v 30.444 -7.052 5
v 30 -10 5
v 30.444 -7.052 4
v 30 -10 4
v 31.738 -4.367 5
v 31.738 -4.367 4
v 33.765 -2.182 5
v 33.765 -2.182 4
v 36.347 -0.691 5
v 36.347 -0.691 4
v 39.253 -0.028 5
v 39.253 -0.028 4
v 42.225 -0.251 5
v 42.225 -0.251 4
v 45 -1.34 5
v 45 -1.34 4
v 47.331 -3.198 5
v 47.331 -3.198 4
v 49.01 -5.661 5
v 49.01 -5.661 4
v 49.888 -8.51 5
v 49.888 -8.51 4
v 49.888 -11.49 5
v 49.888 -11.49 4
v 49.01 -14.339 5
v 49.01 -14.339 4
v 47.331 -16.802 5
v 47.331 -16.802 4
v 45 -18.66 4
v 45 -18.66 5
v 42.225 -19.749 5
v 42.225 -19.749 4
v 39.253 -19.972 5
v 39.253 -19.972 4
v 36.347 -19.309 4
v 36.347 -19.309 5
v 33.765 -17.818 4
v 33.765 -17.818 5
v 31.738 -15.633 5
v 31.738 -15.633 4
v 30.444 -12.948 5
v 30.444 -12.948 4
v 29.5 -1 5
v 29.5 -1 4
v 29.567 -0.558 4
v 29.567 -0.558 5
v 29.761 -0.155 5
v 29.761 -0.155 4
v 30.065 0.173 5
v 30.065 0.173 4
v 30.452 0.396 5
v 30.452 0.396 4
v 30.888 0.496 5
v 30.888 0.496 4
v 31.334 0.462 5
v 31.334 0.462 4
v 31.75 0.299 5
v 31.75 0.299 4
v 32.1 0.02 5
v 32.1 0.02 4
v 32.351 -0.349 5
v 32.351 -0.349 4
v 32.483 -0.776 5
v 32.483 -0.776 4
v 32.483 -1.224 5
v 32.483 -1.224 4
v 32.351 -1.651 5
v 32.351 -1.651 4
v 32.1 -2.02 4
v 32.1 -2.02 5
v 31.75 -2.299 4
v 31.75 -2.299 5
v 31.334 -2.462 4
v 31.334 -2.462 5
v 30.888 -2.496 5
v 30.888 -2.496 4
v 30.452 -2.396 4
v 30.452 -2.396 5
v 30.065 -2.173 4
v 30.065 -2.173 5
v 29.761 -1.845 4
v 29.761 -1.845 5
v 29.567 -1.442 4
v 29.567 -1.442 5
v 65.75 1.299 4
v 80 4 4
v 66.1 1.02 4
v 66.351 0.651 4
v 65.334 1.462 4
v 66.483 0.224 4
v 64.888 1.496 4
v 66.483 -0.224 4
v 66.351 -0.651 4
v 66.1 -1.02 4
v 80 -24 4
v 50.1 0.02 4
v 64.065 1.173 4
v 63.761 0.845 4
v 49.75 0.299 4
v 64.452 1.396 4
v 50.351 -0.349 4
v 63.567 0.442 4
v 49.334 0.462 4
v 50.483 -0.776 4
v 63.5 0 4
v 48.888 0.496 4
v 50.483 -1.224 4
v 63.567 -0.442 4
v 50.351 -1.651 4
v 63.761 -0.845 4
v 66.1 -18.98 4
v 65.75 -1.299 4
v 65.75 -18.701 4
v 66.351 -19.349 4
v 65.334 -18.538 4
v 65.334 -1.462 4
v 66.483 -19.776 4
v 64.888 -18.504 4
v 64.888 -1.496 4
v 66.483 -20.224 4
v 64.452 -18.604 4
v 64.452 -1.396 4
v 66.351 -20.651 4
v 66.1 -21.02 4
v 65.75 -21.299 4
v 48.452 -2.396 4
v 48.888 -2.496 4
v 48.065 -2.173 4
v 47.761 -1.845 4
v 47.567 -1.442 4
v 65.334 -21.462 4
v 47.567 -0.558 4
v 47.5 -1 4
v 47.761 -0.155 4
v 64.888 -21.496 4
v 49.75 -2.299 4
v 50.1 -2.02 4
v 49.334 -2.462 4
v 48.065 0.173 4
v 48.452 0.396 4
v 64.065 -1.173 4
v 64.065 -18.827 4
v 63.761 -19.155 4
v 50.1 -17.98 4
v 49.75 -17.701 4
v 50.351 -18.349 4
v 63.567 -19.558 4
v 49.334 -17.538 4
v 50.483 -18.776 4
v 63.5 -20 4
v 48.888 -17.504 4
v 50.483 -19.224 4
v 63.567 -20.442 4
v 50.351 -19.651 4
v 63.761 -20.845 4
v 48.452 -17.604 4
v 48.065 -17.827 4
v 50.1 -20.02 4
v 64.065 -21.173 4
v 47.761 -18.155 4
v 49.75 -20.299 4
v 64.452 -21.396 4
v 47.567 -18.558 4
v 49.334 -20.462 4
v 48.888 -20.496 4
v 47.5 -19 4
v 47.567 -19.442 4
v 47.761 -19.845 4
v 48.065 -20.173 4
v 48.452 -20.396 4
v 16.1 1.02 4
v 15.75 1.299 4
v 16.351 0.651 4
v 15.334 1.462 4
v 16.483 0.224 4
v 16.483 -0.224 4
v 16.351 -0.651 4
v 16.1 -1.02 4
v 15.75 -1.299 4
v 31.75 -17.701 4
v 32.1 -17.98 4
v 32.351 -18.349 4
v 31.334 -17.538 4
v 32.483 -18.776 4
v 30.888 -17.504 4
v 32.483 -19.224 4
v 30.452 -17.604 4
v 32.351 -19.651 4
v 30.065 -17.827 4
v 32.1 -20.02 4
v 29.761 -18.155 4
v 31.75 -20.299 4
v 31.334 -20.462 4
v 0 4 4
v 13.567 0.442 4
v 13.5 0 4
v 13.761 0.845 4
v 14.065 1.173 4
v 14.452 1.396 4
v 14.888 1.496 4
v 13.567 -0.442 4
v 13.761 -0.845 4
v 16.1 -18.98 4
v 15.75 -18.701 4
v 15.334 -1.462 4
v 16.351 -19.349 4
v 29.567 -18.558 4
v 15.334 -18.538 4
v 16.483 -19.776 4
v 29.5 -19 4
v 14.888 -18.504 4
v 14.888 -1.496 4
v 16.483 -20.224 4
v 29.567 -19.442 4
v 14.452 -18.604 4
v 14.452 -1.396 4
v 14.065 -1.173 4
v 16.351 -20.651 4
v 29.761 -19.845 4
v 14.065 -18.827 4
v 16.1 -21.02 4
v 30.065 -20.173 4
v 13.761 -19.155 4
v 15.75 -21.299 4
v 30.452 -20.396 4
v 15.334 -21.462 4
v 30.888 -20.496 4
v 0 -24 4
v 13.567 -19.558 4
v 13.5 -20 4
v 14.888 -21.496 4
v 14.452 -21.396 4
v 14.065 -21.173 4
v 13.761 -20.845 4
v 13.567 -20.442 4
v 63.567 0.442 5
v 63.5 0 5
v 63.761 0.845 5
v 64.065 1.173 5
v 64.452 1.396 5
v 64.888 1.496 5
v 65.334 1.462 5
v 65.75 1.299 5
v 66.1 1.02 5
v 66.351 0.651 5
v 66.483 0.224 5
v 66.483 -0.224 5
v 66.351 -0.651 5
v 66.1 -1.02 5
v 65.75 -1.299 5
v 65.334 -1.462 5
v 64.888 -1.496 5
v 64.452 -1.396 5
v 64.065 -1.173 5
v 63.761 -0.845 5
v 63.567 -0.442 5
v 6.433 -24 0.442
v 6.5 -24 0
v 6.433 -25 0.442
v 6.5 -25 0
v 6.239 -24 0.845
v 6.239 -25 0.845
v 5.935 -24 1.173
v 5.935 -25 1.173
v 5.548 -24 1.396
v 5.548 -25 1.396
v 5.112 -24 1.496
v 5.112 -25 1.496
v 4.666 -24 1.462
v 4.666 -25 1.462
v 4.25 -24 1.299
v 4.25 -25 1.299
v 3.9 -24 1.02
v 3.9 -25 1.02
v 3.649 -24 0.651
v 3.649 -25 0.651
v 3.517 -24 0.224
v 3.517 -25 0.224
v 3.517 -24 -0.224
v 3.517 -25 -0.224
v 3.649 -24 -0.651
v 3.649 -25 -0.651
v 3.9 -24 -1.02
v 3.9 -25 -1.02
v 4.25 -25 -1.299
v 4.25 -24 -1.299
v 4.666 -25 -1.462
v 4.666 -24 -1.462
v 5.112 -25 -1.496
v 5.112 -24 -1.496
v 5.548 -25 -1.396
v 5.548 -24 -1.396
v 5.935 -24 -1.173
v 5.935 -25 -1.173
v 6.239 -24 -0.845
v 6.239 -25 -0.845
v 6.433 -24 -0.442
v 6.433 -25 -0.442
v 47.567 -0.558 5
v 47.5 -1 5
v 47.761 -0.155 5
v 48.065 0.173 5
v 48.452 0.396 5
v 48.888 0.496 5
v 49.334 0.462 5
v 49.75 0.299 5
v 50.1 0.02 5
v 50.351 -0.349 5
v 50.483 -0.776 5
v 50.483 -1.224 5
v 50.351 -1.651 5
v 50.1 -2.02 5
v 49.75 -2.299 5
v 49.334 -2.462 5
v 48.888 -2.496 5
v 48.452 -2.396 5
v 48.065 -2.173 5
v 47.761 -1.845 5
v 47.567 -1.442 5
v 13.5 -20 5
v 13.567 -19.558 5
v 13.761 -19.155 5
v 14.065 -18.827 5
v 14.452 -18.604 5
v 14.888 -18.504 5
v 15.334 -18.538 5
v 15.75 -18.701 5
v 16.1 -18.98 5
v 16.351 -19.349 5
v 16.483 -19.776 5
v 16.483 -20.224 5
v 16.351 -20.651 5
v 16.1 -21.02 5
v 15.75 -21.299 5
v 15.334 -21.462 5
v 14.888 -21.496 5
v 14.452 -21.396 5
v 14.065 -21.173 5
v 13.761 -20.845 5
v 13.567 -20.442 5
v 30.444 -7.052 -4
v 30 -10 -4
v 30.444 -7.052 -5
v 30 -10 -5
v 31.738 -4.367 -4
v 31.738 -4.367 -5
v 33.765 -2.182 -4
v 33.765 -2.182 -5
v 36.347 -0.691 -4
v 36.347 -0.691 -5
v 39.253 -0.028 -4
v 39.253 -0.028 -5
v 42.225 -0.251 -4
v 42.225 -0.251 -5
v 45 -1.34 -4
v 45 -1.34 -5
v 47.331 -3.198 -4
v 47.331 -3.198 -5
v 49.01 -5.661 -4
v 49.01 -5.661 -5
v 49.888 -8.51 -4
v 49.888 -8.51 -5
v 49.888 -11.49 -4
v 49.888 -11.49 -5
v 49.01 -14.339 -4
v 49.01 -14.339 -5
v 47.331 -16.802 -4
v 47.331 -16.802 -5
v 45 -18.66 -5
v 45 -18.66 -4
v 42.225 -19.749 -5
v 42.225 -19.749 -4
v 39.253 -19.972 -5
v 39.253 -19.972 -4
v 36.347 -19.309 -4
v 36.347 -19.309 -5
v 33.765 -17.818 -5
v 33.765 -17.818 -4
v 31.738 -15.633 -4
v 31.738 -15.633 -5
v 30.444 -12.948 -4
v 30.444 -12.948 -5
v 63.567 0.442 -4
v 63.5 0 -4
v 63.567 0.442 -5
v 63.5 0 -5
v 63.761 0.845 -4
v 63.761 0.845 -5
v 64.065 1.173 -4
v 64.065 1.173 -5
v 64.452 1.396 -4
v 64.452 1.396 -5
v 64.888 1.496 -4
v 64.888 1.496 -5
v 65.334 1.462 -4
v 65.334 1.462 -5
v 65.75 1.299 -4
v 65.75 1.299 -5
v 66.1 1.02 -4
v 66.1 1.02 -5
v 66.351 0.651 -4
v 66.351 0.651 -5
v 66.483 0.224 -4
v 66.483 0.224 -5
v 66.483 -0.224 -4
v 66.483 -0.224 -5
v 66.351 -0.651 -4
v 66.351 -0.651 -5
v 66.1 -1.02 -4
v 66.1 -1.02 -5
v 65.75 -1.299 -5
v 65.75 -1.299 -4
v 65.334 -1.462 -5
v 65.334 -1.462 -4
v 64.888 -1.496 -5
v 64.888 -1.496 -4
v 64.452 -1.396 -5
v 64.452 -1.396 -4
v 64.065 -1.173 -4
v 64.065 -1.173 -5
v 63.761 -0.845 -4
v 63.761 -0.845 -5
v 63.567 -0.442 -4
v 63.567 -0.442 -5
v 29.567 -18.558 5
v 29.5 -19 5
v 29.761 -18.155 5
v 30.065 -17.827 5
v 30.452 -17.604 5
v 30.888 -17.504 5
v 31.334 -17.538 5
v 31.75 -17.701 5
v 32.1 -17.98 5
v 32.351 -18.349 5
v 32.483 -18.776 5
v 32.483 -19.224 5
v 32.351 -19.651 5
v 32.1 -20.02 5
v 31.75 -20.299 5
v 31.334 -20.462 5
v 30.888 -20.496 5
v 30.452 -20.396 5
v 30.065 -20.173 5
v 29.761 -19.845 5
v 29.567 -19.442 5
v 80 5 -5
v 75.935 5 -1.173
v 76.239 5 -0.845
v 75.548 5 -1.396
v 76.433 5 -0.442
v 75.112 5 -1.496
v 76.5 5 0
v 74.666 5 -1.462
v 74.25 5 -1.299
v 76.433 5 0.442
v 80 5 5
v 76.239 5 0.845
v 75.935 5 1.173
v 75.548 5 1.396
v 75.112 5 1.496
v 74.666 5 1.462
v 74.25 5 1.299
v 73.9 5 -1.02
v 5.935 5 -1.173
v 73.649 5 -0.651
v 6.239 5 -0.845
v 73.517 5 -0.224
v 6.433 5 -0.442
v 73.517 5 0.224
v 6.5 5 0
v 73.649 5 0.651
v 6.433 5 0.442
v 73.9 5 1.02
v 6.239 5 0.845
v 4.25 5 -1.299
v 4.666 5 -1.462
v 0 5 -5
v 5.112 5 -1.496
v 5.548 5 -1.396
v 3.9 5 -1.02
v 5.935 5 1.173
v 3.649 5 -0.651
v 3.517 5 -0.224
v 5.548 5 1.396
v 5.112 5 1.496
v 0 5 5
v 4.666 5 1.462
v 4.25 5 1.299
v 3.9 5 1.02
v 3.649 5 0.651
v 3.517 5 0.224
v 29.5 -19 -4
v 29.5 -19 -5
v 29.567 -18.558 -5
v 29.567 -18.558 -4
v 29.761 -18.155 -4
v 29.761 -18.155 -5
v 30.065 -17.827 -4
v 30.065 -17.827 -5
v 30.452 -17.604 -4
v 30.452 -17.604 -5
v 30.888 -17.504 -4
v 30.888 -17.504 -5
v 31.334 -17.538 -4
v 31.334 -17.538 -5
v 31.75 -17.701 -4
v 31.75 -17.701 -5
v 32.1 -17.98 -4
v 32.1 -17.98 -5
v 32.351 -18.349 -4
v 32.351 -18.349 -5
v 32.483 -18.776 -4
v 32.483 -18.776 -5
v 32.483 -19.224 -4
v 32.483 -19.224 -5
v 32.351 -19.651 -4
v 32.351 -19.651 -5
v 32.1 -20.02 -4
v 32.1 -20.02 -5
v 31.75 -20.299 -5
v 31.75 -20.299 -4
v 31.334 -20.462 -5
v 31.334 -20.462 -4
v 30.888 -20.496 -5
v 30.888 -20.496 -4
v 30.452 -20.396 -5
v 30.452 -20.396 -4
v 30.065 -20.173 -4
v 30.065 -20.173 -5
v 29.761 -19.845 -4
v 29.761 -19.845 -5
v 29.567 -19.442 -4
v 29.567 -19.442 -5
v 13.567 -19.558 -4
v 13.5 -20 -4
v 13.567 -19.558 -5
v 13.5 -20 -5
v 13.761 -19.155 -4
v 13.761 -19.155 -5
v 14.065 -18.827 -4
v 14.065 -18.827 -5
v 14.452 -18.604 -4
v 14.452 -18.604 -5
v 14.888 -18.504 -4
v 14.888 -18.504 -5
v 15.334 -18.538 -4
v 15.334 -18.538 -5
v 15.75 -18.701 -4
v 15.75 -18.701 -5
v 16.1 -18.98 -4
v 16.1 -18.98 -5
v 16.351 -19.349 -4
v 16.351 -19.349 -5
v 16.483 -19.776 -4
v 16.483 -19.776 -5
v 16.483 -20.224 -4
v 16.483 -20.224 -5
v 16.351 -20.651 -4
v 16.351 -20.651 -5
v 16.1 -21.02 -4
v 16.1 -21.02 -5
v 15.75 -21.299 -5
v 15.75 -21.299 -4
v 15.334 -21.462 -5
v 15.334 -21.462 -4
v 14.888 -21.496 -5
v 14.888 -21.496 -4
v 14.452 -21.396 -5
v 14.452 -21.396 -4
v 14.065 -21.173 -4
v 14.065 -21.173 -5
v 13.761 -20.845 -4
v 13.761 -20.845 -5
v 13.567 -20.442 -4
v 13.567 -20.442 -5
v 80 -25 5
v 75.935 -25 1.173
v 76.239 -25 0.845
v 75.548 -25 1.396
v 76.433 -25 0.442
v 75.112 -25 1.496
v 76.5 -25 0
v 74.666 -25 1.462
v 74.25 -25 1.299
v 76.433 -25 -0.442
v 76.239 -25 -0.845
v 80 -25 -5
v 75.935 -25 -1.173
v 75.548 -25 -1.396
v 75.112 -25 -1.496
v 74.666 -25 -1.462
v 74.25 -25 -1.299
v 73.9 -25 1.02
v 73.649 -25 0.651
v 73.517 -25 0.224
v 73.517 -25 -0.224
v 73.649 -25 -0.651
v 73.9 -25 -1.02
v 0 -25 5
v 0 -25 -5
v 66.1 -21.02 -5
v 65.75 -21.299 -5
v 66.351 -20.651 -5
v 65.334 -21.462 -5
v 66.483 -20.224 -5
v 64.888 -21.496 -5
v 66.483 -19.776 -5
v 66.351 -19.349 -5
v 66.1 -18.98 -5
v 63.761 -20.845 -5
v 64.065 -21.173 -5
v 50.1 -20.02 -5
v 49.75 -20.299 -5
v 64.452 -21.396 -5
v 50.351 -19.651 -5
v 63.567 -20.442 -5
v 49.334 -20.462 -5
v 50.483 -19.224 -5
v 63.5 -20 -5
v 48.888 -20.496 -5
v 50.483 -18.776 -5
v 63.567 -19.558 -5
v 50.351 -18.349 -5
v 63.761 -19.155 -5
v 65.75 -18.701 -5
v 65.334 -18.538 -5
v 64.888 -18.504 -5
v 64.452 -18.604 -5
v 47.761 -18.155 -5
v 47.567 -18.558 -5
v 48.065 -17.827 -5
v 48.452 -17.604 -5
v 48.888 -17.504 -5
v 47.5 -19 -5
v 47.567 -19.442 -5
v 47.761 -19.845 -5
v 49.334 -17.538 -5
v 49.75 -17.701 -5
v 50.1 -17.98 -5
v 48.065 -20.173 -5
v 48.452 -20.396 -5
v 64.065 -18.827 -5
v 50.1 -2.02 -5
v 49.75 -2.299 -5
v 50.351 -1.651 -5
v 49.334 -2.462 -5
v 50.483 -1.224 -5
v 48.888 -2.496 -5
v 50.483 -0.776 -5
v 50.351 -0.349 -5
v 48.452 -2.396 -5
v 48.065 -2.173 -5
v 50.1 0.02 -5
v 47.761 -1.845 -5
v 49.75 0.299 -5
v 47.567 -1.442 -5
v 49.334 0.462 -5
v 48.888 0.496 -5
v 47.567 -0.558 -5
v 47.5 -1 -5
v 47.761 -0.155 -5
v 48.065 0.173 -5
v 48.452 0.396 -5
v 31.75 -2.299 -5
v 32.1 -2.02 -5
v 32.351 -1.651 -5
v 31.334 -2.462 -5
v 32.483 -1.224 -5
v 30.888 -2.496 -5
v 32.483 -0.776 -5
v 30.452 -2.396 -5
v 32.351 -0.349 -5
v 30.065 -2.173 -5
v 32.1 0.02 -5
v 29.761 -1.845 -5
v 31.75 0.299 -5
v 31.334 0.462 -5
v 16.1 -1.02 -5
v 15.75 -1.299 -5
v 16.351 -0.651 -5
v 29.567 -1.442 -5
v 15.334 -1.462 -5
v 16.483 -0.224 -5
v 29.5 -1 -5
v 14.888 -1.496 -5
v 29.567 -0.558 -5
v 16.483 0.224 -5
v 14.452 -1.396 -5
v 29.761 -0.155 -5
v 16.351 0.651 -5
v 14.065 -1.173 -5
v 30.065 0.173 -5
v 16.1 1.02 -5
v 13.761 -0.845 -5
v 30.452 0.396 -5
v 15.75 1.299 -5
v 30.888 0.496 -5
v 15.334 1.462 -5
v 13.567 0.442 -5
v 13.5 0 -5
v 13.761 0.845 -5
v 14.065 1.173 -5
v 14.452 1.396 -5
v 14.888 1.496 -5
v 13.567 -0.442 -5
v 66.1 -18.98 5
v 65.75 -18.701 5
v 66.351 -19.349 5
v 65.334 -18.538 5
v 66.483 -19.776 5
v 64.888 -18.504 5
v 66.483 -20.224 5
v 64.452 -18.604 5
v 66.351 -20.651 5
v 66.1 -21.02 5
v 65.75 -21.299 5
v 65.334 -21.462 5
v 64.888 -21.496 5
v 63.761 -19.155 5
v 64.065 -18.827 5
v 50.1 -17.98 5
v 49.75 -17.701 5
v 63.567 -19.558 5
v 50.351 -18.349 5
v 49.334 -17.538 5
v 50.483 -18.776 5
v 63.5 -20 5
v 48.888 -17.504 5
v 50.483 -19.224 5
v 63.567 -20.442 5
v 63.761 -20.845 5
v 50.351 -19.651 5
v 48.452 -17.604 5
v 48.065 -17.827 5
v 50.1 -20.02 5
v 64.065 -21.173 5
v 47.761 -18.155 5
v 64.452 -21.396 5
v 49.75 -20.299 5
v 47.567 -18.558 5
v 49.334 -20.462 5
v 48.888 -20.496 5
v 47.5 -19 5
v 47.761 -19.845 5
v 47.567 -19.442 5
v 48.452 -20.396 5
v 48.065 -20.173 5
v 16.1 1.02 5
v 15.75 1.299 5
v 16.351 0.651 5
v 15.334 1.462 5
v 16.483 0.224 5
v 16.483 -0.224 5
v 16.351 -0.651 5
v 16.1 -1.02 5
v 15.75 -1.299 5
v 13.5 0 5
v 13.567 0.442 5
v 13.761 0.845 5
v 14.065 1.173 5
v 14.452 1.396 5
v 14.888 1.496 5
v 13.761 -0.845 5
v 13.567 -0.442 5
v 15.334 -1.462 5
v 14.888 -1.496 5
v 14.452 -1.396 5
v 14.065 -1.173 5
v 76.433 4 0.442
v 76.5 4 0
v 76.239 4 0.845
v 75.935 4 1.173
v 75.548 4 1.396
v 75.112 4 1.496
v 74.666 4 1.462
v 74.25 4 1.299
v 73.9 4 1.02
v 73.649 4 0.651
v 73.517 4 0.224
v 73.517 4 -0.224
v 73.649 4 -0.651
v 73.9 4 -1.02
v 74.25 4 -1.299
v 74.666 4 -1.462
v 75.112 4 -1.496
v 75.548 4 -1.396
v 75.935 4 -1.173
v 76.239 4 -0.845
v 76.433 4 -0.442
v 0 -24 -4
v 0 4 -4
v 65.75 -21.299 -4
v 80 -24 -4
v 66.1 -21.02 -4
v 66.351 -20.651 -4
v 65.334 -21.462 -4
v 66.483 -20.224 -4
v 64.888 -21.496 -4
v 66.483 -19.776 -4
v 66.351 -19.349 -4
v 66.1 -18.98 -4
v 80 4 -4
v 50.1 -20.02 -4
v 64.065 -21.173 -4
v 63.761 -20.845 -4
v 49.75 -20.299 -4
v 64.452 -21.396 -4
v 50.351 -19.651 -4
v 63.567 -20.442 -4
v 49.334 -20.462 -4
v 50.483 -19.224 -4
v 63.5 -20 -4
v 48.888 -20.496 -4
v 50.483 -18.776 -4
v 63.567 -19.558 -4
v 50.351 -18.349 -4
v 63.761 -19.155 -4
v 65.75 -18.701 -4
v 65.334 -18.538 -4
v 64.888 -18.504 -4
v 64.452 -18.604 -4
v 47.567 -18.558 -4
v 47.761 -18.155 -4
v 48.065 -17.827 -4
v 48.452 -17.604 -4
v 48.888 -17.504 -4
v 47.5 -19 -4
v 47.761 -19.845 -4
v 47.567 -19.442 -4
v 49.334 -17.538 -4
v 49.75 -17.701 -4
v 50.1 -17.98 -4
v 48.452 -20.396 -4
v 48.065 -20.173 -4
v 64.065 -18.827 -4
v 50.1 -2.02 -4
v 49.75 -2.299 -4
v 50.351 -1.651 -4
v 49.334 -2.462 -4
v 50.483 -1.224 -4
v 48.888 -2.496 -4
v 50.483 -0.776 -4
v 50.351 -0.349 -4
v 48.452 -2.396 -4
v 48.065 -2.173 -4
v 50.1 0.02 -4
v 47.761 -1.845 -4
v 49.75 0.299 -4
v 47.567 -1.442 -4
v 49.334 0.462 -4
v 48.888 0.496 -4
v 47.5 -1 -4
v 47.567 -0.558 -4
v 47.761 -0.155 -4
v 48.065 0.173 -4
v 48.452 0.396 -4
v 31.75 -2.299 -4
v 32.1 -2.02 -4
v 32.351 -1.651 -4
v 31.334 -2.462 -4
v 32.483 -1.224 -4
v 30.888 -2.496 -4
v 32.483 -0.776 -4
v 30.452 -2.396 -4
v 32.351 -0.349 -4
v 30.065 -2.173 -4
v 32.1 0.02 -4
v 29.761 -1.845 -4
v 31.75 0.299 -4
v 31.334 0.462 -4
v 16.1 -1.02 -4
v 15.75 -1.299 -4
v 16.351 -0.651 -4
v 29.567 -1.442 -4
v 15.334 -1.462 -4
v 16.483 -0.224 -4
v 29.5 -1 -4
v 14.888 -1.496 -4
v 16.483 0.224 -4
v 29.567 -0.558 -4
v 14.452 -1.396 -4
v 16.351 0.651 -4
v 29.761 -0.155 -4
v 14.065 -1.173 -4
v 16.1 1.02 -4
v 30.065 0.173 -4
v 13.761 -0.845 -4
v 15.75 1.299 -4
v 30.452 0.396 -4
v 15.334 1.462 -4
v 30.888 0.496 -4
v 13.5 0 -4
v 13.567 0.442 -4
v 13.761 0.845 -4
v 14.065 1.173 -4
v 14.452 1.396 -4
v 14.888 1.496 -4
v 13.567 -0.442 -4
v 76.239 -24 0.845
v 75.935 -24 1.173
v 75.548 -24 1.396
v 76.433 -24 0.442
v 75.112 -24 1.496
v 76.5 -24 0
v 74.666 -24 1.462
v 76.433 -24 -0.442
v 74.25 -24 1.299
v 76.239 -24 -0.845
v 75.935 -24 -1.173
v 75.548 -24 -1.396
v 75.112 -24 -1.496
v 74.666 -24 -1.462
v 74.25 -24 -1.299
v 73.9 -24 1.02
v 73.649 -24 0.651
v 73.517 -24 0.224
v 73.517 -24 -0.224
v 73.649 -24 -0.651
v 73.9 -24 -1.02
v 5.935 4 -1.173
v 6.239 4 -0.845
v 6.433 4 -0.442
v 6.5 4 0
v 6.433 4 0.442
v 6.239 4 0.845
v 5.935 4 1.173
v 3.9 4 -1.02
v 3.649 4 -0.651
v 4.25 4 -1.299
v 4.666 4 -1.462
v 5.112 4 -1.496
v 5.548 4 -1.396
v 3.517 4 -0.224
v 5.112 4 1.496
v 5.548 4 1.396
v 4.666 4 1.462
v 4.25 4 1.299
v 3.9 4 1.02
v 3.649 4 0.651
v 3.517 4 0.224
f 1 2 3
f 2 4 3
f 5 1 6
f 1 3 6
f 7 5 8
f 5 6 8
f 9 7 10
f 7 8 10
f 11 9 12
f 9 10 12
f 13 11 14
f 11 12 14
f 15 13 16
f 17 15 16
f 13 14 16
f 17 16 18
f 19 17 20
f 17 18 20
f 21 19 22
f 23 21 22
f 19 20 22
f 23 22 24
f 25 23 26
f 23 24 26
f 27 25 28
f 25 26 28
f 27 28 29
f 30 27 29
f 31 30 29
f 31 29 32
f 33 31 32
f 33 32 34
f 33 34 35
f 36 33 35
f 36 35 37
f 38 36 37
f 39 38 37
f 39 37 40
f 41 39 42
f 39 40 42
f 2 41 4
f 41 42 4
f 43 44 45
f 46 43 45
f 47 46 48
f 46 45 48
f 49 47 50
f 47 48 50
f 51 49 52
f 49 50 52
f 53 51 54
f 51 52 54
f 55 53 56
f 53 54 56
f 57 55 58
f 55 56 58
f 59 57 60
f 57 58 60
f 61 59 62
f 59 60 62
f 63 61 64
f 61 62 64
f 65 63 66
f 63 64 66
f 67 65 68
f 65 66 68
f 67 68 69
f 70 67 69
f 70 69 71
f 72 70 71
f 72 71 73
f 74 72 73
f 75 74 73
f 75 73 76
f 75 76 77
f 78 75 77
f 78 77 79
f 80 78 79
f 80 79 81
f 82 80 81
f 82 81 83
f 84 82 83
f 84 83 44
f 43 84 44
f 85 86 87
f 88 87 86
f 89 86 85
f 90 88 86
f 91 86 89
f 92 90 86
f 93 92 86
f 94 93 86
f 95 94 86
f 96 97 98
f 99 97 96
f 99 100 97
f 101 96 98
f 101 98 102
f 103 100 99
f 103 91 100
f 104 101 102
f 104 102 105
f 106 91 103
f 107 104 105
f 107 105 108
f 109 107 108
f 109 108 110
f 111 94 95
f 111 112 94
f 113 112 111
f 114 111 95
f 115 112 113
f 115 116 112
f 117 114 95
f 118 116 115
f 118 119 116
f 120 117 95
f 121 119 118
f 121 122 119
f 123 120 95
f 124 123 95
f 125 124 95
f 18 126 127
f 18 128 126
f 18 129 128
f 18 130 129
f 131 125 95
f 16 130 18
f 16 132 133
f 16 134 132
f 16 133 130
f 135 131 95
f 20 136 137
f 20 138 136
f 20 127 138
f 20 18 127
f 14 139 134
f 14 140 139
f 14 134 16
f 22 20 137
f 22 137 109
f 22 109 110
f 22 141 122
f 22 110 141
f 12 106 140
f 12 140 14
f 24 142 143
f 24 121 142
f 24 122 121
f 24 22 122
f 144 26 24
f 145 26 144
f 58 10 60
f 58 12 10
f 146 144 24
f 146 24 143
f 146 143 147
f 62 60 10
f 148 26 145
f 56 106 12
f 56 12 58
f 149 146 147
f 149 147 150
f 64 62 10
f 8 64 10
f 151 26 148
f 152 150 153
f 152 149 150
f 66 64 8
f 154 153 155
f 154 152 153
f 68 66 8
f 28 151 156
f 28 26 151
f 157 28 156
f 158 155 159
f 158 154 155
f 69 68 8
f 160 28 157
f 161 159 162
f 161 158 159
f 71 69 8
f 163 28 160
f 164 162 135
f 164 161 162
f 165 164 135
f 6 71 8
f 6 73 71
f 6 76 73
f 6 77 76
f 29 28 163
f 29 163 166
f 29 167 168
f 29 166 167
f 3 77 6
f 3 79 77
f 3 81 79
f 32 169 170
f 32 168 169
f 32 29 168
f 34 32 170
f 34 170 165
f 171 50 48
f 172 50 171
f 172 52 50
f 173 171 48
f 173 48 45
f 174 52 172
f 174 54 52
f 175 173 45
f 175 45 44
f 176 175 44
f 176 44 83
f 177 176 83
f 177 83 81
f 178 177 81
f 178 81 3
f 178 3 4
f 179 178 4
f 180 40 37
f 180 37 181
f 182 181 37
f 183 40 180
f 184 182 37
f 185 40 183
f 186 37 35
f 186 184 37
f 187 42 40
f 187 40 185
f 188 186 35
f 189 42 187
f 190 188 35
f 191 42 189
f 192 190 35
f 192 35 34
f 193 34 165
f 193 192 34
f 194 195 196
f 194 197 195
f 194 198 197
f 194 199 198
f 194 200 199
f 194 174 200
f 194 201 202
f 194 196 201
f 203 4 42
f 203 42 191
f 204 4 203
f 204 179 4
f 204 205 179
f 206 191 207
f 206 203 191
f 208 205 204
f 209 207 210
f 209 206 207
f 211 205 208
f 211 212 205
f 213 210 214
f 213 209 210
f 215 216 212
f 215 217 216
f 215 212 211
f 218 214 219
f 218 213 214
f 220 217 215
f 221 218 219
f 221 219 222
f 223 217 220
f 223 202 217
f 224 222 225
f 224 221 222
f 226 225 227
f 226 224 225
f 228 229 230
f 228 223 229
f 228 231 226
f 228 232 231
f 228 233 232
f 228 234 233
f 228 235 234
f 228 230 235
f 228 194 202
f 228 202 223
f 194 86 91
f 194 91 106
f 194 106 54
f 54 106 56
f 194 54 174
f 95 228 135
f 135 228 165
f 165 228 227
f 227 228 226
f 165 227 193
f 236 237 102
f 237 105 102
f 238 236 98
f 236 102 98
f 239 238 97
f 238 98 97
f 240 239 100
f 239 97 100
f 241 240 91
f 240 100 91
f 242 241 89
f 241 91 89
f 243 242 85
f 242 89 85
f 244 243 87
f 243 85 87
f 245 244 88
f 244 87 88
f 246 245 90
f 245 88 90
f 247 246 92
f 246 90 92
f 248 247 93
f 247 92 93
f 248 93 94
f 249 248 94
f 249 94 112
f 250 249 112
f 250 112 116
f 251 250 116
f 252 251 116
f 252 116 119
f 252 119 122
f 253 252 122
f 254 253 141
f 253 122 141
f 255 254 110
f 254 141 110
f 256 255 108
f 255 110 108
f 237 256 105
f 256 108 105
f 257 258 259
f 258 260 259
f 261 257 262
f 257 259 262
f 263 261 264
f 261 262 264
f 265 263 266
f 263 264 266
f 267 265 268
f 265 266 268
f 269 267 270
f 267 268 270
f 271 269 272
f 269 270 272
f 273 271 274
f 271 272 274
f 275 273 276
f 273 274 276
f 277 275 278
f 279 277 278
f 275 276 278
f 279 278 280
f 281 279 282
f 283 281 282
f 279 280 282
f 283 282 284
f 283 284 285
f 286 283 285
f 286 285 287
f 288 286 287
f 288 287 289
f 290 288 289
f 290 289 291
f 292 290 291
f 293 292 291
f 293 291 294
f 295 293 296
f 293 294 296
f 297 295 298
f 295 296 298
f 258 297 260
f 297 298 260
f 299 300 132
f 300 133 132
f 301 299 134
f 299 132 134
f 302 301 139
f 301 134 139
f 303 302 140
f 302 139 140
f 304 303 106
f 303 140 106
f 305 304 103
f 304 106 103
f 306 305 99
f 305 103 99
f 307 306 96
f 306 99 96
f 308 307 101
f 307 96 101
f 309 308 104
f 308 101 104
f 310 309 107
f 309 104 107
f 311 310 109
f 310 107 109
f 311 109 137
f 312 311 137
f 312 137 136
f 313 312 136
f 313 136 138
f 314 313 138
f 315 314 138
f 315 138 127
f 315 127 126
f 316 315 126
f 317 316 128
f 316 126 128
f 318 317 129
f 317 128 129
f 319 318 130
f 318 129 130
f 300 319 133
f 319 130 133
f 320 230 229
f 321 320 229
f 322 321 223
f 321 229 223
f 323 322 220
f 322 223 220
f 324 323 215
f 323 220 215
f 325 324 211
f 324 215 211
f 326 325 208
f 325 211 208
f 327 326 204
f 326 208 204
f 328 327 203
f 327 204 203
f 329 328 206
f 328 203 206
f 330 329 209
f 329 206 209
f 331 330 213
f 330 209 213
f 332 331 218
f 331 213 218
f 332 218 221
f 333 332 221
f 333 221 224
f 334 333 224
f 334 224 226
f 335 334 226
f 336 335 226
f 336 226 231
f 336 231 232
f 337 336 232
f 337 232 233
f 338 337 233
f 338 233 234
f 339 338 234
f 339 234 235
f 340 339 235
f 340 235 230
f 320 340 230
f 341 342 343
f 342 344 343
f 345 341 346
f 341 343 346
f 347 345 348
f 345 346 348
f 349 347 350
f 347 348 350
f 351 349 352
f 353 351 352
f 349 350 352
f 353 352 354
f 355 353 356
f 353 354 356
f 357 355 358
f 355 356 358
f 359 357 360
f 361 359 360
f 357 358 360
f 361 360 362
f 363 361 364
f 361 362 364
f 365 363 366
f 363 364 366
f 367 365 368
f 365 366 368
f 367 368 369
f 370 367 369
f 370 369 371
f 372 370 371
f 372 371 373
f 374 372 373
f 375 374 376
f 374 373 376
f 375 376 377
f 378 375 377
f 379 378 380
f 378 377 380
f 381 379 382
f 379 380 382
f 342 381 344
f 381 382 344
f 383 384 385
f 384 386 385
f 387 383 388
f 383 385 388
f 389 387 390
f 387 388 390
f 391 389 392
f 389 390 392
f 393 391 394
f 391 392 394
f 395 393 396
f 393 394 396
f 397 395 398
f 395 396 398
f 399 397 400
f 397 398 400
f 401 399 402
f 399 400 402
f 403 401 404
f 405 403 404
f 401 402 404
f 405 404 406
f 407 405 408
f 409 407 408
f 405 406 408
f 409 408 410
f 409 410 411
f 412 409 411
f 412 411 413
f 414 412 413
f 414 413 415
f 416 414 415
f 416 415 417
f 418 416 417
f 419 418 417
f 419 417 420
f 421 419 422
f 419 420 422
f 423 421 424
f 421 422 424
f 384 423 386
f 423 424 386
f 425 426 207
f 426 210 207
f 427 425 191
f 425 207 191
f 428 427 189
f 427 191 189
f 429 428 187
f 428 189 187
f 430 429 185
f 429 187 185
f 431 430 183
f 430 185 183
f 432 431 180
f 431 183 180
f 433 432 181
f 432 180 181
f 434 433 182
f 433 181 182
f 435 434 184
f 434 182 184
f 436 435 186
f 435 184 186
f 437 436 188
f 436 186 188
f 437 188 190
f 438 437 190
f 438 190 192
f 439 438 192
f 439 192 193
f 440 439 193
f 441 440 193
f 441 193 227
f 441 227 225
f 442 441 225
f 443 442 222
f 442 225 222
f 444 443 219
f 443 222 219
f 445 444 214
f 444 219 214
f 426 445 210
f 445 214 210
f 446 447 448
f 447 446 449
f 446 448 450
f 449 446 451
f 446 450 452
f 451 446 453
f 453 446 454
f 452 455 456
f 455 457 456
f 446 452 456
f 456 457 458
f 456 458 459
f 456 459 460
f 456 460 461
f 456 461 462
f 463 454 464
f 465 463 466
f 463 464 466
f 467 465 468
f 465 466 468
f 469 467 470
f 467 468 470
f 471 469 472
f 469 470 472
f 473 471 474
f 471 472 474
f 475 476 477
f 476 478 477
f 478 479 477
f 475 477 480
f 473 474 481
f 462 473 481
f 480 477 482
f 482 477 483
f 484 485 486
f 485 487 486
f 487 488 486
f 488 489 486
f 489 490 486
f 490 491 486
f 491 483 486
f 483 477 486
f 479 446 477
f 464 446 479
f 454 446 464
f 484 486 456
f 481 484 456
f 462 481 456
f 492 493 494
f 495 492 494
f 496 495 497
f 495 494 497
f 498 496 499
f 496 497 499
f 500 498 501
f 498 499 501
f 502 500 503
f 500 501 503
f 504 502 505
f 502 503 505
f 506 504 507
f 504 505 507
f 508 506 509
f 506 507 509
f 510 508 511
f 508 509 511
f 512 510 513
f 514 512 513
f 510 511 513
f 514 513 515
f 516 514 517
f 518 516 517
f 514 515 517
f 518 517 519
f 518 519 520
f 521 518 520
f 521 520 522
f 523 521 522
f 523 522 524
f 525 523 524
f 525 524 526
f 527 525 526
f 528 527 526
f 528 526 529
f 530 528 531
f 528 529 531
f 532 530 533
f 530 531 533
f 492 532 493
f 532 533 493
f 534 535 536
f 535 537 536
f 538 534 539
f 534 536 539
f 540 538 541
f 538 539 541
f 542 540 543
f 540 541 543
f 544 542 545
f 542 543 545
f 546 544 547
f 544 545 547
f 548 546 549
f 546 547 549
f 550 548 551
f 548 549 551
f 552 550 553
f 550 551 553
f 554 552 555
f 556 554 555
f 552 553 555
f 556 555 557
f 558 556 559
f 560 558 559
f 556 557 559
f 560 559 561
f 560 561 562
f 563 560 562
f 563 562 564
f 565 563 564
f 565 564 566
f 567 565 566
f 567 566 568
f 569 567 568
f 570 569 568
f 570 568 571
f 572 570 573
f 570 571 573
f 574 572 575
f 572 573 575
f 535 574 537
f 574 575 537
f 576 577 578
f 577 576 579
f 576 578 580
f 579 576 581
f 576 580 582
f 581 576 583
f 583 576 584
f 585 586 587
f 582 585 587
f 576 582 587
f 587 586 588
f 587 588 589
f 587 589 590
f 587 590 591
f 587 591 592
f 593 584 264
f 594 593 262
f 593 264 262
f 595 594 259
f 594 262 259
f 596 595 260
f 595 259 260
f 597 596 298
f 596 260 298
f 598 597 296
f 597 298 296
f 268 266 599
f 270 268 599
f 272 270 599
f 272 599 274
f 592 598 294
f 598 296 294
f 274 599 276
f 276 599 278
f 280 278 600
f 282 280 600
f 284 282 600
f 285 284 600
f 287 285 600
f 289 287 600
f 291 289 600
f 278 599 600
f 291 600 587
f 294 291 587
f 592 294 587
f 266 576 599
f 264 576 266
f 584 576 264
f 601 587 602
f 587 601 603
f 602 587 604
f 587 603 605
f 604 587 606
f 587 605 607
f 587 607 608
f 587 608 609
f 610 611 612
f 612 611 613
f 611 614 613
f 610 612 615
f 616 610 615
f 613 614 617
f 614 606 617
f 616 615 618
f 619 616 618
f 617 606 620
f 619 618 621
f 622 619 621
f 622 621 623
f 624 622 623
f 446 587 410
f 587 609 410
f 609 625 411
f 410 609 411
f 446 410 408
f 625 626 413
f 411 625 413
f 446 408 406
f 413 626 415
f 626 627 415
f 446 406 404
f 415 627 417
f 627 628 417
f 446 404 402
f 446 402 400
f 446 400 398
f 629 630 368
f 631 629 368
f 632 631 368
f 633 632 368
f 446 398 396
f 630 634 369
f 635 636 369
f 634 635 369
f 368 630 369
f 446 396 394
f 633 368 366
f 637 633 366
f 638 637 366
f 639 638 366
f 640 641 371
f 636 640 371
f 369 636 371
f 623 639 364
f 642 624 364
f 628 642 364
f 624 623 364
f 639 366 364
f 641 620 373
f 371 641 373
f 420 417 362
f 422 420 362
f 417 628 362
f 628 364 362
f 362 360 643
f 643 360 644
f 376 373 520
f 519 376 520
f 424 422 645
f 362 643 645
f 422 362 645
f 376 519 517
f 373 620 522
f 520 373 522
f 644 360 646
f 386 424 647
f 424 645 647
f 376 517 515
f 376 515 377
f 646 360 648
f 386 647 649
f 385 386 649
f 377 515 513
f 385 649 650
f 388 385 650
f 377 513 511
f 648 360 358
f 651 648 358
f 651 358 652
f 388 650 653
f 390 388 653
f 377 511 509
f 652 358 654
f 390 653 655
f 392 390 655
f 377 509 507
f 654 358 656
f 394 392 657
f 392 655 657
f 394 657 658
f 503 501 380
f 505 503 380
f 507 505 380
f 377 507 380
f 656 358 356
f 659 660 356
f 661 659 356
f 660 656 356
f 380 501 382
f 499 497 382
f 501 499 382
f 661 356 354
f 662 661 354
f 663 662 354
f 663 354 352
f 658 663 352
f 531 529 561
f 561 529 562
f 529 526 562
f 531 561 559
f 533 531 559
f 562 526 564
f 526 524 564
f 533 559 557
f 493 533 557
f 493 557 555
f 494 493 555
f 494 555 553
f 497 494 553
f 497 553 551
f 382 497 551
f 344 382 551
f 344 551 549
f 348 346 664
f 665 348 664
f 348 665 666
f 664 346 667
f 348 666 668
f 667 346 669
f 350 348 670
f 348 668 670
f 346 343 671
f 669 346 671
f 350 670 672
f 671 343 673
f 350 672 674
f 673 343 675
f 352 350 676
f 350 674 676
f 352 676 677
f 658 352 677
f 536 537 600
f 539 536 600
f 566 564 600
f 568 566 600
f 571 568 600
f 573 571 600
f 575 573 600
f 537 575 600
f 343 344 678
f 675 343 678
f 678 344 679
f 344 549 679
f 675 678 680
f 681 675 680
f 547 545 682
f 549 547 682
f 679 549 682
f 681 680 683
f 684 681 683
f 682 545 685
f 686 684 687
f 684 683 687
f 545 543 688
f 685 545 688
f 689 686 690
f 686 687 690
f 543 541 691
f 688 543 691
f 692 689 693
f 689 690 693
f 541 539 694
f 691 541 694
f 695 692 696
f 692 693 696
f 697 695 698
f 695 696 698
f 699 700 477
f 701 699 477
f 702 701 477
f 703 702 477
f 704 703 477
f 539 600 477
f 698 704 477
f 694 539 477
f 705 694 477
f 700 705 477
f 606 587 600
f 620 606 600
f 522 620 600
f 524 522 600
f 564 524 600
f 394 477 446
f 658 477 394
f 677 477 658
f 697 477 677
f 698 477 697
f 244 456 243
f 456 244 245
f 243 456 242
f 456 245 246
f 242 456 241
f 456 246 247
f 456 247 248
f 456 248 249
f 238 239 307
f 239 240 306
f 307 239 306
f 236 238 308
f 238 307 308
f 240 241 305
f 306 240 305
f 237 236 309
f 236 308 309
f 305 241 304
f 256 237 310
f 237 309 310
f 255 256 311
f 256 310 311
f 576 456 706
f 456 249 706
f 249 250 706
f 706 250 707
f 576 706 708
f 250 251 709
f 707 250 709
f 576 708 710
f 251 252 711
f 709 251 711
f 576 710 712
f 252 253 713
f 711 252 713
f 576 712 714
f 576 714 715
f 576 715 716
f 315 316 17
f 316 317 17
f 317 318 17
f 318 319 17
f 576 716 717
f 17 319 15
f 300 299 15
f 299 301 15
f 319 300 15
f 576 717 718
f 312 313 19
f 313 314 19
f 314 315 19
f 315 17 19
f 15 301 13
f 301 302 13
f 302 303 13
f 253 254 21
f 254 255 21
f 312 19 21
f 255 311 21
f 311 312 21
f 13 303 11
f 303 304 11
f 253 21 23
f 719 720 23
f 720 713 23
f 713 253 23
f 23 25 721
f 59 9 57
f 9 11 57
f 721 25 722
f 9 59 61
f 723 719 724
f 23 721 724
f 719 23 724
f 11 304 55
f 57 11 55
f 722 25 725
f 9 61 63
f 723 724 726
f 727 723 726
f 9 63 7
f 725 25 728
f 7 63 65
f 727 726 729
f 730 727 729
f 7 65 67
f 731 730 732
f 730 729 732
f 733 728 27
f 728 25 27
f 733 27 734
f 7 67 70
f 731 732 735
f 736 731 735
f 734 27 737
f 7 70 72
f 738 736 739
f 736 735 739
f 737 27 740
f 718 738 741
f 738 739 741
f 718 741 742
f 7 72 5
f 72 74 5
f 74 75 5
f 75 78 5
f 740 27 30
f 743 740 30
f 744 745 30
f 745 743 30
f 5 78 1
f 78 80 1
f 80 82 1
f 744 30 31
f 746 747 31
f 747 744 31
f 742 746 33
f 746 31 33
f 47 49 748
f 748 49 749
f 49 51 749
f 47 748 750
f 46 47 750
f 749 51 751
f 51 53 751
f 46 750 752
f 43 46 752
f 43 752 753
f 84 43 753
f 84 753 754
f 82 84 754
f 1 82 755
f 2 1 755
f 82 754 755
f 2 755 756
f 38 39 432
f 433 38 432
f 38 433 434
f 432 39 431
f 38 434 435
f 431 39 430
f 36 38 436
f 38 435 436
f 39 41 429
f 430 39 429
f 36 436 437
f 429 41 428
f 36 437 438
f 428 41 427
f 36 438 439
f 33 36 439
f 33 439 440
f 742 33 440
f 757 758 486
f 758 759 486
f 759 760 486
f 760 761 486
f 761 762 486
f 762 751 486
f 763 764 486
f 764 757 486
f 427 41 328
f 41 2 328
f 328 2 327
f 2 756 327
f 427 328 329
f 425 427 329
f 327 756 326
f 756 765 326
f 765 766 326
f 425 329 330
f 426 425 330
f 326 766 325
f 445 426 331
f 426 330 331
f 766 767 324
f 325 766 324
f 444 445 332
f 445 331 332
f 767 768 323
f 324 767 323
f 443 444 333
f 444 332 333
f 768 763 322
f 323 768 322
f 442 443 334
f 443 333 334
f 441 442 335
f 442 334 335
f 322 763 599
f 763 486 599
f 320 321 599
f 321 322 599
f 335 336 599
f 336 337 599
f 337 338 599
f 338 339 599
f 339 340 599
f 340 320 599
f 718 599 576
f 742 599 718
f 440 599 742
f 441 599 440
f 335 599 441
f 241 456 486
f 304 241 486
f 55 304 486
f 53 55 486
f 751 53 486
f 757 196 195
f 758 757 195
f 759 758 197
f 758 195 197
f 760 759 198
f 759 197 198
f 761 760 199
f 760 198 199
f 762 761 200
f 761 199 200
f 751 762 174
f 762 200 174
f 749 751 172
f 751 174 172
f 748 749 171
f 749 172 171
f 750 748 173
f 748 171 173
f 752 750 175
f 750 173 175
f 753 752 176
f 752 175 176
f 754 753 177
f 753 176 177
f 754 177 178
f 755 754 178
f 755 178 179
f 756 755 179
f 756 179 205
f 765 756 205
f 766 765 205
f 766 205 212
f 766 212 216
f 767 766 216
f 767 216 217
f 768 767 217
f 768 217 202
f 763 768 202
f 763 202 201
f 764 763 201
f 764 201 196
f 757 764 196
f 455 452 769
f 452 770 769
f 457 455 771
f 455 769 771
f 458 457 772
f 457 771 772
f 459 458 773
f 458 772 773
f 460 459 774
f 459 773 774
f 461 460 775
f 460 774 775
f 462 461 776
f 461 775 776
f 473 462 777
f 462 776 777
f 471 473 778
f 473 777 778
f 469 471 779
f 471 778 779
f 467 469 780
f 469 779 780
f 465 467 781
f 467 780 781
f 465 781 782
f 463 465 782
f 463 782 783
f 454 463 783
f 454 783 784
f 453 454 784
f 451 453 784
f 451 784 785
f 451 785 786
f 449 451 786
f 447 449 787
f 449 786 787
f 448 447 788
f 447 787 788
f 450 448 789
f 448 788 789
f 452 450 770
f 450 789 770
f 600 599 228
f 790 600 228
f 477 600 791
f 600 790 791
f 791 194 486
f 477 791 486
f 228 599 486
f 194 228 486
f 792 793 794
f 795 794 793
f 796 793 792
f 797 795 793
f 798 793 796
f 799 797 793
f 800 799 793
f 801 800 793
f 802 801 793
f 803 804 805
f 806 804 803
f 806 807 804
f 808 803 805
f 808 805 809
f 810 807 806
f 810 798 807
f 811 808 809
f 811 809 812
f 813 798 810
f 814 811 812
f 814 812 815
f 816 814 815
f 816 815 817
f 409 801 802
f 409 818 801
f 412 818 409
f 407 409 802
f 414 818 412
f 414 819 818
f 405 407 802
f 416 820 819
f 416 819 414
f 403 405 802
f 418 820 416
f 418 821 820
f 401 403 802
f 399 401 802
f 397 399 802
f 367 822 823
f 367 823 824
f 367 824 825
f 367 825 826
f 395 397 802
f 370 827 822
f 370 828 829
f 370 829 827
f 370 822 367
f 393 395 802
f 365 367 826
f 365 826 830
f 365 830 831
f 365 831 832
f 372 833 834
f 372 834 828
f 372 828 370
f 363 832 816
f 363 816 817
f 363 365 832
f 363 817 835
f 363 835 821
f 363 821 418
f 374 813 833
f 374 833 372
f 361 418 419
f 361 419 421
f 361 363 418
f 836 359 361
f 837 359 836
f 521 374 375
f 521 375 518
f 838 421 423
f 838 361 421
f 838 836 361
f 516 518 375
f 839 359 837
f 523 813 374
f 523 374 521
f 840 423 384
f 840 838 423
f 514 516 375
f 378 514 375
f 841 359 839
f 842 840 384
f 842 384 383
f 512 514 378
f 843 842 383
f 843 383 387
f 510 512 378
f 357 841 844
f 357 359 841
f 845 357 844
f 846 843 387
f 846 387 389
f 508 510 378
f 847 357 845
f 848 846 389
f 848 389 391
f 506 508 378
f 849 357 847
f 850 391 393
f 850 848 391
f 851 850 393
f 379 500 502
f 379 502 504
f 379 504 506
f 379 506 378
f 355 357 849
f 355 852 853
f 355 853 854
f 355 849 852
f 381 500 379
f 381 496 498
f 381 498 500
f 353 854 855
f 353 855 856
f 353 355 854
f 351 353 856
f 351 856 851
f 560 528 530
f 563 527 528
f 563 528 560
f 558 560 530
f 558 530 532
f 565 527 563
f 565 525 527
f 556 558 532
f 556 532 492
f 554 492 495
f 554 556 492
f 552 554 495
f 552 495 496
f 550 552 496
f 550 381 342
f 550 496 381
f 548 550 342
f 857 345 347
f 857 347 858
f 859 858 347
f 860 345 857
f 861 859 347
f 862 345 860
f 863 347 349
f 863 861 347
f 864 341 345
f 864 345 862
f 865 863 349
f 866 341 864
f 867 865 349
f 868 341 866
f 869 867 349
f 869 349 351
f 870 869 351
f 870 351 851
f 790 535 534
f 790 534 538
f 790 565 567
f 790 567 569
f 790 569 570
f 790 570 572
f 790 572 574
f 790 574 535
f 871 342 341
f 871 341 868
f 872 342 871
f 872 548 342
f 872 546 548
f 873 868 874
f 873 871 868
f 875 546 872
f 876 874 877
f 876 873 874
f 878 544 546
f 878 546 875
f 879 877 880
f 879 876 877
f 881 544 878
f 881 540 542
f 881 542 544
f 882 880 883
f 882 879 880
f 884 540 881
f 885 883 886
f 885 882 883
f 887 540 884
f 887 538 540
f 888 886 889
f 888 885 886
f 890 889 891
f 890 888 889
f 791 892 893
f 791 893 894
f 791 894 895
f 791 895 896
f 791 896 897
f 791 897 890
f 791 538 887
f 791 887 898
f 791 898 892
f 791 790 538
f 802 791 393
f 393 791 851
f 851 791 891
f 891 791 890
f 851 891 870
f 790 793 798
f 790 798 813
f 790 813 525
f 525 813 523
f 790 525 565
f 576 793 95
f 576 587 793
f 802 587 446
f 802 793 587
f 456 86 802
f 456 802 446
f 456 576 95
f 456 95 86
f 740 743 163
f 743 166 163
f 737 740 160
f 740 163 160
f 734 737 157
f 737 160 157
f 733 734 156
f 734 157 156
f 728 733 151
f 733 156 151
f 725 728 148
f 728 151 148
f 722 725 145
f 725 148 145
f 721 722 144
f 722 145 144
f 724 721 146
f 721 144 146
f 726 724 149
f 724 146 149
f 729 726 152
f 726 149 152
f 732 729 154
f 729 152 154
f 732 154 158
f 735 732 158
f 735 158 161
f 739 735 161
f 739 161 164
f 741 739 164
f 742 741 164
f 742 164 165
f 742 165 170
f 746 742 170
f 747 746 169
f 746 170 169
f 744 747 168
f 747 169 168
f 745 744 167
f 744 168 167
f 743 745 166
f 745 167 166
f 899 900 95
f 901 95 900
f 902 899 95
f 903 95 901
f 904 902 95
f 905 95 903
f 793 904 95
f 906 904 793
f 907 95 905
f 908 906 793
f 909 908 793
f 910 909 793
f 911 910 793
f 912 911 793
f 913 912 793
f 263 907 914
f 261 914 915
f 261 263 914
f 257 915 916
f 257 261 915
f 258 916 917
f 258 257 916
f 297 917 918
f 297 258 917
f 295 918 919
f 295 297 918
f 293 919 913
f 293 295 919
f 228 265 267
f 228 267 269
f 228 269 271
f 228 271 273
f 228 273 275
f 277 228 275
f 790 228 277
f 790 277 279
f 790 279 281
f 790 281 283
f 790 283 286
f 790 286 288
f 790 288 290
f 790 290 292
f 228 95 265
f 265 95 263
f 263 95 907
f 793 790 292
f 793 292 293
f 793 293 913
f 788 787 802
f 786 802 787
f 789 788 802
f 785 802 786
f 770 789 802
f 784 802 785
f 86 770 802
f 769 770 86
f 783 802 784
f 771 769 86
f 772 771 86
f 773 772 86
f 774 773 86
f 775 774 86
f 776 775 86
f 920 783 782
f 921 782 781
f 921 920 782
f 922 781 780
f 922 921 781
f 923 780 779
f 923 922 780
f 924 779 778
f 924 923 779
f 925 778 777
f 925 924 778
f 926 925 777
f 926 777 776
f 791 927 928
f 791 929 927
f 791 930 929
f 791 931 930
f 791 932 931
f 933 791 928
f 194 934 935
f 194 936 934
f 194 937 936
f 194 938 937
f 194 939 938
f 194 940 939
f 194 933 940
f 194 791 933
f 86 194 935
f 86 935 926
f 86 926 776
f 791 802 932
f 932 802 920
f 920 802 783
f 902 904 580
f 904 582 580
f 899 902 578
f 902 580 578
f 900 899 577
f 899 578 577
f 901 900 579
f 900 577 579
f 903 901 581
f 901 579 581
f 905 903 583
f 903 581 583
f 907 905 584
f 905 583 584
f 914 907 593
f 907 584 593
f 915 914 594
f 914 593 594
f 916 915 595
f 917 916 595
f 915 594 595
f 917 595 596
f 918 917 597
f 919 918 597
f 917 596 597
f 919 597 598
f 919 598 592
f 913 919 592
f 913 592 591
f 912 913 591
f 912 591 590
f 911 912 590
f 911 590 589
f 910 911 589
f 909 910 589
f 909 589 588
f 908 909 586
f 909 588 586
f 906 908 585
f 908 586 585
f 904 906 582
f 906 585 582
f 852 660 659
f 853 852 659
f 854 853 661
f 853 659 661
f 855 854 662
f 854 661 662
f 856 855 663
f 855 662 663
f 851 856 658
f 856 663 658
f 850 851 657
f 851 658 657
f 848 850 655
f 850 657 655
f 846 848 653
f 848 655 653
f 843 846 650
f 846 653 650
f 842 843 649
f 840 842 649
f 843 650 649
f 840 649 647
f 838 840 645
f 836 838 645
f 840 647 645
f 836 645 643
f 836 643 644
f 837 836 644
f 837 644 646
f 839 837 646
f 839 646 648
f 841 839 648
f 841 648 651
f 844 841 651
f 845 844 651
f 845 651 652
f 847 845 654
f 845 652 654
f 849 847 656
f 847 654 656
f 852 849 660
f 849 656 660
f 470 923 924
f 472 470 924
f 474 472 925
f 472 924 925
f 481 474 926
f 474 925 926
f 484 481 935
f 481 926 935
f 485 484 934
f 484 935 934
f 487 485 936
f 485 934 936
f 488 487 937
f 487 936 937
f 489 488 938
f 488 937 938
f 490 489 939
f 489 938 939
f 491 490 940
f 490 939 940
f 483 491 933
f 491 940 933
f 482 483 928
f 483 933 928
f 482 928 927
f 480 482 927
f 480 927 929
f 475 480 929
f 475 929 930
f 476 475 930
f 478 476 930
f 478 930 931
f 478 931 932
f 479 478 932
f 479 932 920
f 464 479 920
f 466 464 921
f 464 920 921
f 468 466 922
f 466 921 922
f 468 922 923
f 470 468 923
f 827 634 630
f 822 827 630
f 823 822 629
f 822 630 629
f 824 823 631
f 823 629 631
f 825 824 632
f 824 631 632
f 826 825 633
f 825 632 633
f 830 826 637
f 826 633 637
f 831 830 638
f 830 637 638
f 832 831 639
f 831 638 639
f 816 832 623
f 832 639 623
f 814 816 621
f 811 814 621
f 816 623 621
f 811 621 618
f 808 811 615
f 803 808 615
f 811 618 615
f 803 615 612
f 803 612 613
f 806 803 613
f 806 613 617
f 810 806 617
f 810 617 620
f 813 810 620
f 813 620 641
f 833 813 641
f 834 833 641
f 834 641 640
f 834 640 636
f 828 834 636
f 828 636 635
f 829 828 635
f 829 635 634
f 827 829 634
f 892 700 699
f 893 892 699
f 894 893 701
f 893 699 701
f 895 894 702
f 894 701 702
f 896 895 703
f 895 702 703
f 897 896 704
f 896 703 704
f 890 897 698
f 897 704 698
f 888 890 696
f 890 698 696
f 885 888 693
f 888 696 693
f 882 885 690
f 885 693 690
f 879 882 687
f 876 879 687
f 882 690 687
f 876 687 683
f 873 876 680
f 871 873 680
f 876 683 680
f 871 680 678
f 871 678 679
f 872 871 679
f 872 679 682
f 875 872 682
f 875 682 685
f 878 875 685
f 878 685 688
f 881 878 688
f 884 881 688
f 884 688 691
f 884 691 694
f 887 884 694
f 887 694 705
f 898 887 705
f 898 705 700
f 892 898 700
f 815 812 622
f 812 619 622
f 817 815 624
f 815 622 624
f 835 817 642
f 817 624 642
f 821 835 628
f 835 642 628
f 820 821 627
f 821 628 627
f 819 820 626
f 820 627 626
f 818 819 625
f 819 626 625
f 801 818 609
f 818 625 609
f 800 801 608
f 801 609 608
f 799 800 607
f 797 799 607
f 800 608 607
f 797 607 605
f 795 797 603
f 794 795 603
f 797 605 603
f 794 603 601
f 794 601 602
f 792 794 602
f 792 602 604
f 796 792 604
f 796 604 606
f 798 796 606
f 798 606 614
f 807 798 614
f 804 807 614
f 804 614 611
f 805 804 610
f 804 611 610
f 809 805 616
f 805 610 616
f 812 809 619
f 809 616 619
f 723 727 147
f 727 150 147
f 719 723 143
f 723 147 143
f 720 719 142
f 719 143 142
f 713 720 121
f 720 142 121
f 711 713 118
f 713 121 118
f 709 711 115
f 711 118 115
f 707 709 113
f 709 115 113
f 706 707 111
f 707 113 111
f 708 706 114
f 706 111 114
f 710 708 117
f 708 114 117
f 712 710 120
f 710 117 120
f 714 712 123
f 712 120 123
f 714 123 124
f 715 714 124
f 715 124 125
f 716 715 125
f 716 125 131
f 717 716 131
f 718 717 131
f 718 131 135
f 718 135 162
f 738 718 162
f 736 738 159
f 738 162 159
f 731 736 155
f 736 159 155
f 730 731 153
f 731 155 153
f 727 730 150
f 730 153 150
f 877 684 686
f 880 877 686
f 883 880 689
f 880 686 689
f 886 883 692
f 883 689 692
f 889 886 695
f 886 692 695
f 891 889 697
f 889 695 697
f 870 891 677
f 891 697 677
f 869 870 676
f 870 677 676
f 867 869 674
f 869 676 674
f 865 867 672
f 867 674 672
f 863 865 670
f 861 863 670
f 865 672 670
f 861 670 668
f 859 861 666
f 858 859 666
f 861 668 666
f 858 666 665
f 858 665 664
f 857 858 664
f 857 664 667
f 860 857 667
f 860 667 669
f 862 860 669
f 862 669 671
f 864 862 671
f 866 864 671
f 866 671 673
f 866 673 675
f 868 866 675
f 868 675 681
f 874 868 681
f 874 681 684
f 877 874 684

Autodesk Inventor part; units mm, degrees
ref_plane "YZ Plane" through (0, 0, 0) normal (1, 0, 0) x (0, 1, 0)
ref_plane "XZ Plane" through (0, 0, 0) normal (0, 1, 0) x (-1, 0, 0)
ref_plane "XY Plane" through (0, 0, 0) normal (0, 0, 1) x (1, 0, 0)
sketch "スケッチ1" plane through (0, 0, 0) normal (1, 0, 0) x (0, 1, 0)
  line L0 (5, 5) -> (-25, 5)
  line L1 (-25, 5) -> (-25, -5)
  line L2 (-25, -5) -> (5, -5)
  line L3 (5, -5) -> (5, 5)
  line L4 (4, 4) -> (-24, 4)
  line L5 (-24, 4) -> (-24, -4)
  line L6 (-24, -4) -> (4, -4)
  line L7 (4, -4) -> (4, 4)
  point P0 (0, 0)
  dimension "d0" = 1
  dimension "d1" = 1
  dimension "d2" = 1
  dimension "d3" = 1
  dimension "d4" = 10
  dimension "d5" = 30
  dimension "d6" = 5
  dimension "d7" = 5
extrude "押し出し1" add sketch "スケッチ1" along normal blind 80
sketch "スケッチ2" plane through (0, -25, -5) normal (0, 0, -1) x (-1, 0, 0)
  circle A0 centre (-40, 15) radius 10
  line L0 (0, 30) -> (-80, 30) projected
  line L1 (0, 0) -> (-80, 0) projected
  line L2 (0, 0) -> (0, 30) projected
  line L3 (-80, 0) -> (-80, 30) projected
  circle A1 centre (-49, 24) radius 1.5
  circle A2 centre (-31, 24) radius 1.5
  circle A3 centre (-49, 6) radius 1.5
  circle A4 centre (-31, 6) radius 1.5
  point P0 (0, 25)
  dimension "d10" = 20
  dimension "d11" = 15
  dimension "d12" = 15
  dimension "d13" = 40
  dimension "d14" = 40
  dimension "d15" = 3
  dimension "d16" = 3
  dimension "d17" = 3
  dimension "d18" = 3
  dimension "d19" = 18
  dimension "d20" = 0
  dimension "d21" = 18
  dimension "d22" = 18
  dimension "d23" = 18
  dimension "d24" = 0
  dimension "d25" = 9
  dimension "d26" = 9
  dimension "d27" = 9
  dimension "d28" = 9
  dimension "d29" = 9
  dimension "d30" = 9
  dimension "d31" = 9
extrude "押し出し2" cut sketch "スケッチ2" against normal blind 60 contours A0 | A1 | A2 | A3 | A4
sketch "スケッチ3" plane through (0, -25, -5) normal (0, -1, 0) x (1, 0, 0)
  circle A0 centre (5, 5) radius 1.5
  circle A1 centre (75, 5) radius 1.5
  line L0 (0, 10) -> (0, 0) projected
  line L1 (0, 0) -> (80, 0) projected
  line L2 (80, 10) -> (80, 0) projected
  point P0 (0, 5)
  dimension "d34" = 5
  dimension "d35" = 5
  dimension "d36" = 3
  dimension "d37" = 5
  dimension "d38" = 3
  dimension "d39" = 5
extrude "押し出し3" cut sketch "スケッチ3" against normal blind 60
sketch "スケッチ4" plane through (0, -25, -5) normal (0, 0, -1) x (-1, 0, 0)
  circle A0 centre (-15, 5) radius 1.5
  circle A1 centre (-15, 25) radius 1.5
  circle A2 centre (-65, 5) radius 1.5
  circle A3 centre (-65, 25) radius 1.5
  line L0 (0, 0) -> (0, 30) projected
  line L1 (-80, 0) -> (-80, 30) projected
  line L2 (0, 0) -> (-80, 0) projected
  line L3 (0, 30) -> (-80, 30) projected
  point P0 (0, 25)
  dimension "d42" = 3
  dimension "d43" = 3
  dimension "d44" = 15
  dimension "d45" = 15
  dimension "d46" = 15
  dimension "d47" = 15
  dimension "d48" = 3
  dimension "d49" = 3
  dimension "d50" = 5
  dimension "d51" = 5
  dimension "d52" = 5
  dimension "d53" = 5
extrude "押し出し4" cut sketch "スケッチ4" against normal blind 43 contours A0 | A1 | A2 | A3
properties part number "モーターパーツ１" material "アルミニウム 6061"
